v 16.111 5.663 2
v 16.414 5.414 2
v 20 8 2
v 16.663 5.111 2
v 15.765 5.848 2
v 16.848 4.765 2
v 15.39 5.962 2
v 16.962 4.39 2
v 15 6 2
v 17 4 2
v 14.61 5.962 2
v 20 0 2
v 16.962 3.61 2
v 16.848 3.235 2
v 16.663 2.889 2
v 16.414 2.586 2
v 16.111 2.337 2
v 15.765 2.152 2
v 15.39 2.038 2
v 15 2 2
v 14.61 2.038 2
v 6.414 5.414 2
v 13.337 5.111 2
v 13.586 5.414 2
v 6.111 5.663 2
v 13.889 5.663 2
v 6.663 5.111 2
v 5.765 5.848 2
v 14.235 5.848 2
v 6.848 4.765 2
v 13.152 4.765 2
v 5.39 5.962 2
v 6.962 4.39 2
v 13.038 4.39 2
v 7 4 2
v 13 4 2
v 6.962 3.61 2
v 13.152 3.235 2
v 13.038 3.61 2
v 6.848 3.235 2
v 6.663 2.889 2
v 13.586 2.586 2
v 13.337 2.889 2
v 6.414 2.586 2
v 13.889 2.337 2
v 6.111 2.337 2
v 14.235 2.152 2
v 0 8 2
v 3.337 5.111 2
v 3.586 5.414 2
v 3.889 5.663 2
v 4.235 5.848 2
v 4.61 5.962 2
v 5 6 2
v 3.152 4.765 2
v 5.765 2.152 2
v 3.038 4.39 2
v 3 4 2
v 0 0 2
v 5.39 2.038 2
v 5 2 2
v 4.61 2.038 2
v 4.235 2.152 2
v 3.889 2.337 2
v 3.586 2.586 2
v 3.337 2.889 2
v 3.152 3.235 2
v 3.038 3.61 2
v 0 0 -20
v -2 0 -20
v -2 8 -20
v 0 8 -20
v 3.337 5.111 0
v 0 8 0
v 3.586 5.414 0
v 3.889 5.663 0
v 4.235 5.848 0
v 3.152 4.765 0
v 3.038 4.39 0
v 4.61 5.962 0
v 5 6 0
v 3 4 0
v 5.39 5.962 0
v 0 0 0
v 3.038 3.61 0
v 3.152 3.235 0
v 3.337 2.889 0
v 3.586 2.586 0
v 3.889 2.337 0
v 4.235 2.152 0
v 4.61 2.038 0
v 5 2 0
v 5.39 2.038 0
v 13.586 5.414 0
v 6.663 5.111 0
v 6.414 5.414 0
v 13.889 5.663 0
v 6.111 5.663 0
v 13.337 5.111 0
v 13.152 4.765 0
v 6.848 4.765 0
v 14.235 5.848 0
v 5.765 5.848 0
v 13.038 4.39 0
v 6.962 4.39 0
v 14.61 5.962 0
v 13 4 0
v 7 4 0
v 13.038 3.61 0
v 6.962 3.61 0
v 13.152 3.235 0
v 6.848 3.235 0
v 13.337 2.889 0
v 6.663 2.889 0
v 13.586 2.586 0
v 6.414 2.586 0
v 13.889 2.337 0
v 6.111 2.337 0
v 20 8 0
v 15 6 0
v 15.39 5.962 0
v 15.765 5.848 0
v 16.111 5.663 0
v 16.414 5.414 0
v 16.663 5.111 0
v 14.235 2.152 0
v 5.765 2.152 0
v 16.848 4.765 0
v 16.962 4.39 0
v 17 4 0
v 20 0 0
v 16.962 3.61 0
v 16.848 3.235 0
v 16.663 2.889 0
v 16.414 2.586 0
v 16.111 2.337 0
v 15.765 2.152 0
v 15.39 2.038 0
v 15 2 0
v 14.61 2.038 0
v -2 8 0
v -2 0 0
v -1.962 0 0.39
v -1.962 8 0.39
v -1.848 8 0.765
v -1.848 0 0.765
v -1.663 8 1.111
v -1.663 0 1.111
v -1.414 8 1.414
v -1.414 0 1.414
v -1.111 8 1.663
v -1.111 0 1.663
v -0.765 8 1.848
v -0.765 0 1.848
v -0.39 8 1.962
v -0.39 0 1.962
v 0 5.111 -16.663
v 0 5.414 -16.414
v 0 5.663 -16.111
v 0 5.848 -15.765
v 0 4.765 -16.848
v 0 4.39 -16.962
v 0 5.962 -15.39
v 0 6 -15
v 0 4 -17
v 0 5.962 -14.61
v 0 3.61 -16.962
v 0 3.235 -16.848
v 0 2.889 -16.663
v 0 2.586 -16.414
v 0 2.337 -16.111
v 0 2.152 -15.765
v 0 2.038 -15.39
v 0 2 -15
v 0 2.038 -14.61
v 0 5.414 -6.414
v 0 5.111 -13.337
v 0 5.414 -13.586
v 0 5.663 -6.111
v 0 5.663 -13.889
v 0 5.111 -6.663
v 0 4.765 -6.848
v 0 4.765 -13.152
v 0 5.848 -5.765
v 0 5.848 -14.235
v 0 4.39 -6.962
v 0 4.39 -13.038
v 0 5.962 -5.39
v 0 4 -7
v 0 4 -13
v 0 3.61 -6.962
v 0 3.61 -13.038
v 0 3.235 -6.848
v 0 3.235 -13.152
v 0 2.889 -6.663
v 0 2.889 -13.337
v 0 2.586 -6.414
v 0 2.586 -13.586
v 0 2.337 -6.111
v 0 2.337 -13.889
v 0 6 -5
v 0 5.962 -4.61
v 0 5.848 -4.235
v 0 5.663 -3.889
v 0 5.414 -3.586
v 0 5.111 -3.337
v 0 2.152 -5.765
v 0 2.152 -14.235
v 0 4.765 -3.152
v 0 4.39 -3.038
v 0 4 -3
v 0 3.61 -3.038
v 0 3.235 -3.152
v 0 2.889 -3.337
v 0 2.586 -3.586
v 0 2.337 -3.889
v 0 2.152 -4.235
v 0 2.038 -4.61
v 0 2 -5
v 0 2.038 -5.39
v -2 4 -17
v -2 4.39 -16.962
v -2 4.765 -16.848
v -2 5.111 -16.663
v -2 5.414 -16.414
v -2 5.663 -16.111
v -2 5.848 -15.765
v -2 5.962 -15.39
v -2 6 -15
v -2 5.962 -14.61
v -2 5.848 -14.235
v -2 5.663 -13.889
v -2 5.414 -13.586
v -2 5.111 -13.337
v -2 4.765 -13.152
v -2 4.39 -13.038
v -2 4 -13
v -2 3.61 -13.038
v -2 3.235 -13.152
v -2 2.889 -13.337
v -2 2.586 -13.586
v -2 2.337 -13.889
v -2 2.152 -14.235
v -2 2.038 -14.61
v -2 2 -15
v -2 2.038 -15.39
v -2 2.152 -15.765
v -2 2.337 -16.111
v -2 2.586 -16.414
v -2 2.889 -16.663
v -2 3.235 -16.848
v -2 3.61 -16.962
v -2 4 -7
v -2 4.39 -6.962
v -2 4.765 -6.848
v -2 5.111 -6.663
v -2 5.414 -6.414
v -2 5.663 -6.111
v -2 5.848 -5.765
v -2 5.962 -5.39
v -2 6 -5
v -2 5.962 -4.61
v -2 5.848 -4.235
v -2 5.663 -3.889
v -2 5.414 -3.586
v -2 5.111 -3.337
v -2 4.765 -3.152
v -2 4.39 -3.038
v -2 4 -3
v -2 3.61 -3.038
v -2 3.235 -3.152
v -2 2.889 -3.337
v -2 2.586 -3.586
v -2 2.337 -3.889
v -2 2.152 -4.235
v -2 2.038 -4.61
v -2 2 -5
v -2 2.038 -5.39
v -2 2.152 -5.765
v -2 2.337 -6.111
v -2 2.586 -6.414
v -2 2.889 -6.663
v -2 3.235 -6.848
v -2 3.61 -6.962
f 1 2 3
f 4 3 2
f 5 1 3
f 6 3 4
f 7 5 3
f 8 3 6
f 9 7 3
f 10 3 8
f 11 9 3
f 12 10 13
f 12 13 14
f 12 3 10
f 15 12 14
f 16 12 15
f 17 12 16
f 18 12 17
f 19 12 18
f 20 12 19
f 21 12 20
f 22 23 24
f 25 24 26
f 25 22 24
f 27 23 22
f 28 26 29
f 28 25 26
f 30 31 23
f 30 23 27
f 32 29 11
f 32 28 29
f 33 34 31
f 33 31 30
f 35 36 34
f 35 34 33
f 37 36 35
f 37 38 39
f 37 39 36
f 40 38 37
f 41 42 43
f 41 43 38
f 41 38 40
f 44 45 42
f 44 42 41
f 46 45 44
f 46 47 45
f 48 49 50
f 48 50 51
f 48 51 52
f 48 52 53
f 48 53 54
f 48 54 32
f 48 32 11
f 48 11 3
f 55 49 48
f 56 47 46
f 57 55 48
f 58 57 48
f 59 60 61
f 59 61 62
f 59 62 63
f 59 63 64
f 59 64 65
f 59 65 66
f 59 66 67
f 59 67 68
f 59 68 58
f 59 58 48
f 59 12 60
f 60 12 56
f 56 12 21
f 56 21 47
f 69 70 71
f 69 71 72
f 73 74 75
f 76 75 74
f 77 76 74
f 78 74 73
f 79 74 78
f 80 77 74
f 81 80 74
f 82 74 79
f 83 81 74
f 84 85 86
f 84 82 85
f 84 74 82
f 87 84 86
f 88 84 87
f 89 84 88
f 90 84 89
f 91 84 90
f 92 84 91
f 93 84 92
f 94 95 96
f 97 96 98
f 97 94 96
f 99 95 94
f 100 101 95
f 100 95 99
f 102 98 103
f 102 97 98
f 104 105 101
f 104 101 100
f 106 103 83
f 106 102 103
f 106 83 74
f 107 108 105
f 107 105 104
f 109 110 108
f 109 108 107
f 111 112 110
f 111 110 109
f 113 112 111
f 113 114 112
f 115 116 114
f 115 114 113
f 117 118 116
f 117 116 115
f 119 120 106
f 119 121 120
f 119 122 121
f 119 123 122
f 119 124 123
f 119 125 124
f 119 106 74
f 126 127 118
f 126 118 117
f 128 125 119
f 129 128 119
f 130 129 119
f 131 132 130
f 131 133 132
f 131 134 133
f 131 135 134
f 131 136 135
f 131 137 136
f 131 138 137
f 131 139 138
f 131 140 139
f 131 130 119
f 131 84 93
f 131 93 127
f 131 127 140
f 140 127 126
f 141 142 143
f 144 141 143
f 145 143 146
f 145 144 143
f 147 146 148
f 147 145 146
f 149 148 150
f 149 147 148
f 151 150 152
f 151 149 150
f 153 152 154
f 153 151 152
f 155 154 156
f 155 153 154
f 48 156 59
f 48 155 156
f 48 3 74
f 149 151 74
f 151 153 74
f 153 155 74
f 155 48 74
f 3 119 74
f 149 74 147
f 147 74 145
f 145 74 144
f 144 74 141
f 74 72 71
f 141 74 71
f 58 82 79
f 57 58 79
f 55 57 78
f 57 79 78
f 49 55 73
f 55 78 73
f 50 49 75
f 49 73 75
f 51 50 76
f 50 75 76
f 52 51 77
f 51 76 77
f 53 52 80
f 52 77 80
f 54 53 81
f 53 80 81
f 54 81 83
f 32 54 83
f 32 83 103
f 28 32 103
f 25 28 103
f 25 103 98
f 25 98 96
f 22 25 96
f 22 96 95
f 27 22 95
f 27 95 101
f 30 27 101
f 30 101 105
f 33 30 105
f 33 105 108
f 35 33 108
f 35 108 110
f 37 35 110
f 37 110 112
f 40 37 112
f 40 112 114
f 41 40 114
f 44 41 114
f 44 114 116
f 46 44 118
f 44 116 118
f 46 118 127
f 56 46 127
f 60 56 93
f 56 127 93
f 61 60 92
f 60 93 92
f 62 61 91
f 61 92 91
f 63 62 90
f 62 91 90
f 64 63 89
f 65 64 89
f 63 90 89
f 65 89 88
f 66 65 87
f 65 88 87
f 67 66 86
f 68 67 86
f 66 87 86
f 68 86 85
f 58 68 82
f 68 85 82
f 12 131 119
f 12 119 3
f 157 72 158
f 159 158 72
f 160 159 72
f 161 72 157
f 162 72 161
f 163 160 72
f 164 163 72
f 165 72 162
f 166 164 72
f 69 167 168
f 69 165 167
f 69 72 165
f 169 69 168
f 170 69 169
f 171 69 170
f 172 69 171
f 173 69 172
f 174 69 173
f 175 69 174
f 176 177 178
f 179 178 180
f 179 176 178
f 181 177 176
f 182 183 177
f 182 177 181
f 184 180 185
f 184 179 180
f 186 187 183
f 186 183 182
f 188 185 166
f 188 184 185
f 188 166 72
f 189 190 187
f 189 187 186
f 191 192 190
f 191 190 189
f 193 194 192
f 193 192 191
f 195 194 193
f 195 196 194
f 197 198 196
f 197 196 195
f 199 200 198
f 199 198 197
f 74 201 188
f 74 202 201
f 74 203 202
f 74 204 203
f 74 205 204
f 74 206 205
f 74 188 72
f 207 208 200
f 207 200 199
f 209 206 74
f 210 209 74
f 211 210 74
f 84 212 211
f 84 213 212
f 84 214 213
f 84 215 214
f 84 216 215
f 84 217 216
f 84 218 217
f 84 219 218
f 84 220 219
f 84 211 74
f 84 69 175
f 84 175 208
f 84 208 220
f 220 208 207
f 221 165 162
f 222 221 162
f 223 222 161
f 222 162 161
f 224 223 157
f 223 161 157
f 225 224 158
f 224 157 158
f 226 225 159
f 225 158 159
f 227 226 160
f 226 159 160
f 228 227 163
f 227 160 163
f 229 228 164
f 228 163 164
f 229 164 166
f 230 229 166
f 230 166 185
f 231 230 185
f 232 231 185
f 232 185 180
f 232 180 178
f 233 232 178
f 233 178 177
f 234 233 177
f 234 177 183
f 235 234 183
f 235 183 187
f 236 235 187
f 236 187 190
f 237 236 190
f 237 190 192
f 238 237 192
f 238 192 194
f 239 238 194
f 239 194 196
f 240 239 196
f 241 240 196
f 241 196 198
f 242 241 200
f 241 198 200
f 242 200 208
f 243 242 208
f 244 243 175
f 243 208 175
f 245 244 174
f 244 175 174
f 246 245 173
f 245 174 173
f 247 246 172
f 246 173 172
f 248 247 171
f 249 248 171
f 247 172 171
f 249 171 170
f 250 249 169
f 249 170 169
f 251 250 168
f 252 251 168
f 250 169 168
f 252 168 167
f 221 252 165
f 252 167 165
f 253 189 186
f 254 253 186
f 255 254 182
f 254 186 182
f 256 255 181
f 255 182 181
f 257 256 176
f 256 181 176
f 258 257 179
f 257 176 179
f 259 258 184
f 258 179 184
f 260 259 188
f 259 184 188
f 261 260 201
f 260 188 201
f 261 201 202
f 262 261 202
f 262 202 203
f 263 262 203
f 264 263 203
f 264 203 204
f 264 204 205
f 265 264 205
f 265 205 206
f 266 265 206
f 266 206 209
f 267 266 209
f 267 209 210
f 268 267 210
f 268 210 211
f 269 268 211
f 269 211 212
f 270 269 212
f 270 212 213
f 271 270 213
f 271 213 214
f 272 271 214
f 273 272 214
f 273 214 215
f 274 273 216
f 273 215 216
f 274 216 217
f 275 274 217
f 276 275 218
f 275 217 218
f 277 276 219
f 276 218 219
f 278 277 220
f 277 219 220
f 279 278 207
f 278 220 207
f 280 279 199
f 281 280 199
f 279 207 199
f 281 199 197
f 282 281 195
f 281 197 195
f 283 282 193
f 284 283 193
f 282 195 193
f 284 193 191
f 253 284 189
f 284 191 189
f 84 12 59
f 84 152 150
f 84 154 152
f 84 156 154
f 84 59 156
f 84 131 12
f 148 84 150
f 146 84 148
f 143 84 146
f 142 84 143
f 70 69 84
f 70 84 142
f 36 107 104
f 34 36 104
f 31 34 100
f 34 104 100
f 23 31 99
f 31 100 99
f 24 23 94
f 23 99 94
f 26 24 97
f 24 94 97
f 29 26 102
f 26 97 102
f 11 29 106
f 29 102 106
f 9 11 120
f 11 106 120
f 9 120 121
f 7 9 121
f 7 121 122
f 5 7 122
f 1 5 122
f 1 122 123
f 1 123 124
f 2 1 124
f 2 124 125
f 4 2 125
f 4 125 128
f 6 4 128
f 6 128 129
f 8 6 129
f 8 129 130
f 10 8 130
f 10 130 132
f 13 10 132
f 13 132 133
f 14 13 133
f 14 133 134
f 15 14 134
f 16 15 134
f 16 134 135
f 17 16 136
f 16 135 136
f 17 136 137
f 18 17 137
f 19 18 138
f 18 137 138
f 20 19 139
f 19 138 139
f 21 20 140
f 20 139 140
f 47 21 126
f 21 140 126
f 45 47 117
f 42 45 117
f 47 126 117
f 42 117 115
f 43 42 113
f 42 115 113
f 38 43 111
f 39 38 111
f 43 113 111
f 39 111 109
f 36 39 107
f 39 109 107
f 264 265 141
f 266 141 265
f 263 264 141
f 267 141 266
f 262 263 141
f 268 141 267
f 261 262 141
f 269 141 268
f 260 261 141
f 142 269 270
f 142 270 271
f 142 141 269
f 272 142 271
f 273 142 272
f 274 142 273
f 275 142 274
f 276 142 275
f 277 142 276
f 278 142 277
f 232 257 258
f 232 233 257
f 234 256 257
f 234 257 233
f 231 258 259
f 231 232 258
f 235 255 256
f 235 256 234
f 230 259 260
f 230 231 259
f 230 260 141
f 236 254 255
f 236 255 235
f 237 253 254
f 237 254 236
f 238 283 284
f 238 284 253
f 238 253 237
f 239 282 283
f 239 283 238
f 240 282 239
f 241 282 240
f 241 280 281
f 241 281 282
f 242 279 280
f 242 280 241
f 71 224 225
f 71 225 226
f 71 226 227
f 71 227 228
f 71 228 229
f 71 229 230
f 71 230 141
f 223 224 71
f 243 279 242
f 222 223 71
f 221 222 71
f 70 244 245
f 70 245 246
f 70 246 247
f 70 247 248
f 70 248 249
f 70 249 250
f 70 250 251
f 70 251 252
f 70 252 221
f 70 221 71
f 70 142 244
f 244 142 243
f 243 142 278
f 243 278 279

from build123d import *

# Parameters (mm, degrees)
BOSS_EXTRUDE1_DEPTH = 8
SKETCH2_R           = 2
CUT_EXTRUDE1_DEPTH  = 8
SKETCH3_R           = 2
CUT_EXTRUDE2_DEPTH  = 8
FILLET3_R           = 2


with BuildPart() as part:
    # Sketch1 → Boss-Extrude1 (new body)
    with BuildSketch(Plane(origin=(0, 0, 0), x_dir=(1, 0, 0), z_dir=(0, 1, 0))):
        Polygon((0, 20), (0, 0), (20, 0), (20, -2), (-2, -2), (-2, 20), align=None)
    extrude(amount=BOSS_EXTRUDE1_DEPTH)

    # Sketch2 → Cut-Extrude1 (cut)
    with BuildSketch(Plane(origin=(0, 0, 0), x_dir=(-1, 0, 0), z_dir=(0, 0, -1))):
        with Locations((-15, 4)):
            Circle(SKETCH2_R)
        with Locations((-5, 4)):
            Circle(SKETCH2_R)
    extrude(amount=-CUT_EXTRUDE1_DEPTH, mode=Mode.SUBTRACT)

    # Sketch3 → Cut-Extrude2 (cut)
    with BuildSketch(Plane(origin=(0, 0, 0), x_dir=(0, 0, -1), z_dir=(1, 0, 0))):
        with Locations((5, 4)):
            Circle(SKETCH3_R)
        with Locations((15, 4)):
            Circle(SKETCH3_R)
    extrude(amount=-CUT_EXTRUDE2_DEPTH, mode=Mode.SUBTRACT)

    # Fillet3
    fillet3_edges = [part.edges().sort_by_distance(p)[0] for p in [
        (-2, 4, 2),
    ]]
    fillet(fillet3_edges, radius=FILLET3_R)


solid = part.part
